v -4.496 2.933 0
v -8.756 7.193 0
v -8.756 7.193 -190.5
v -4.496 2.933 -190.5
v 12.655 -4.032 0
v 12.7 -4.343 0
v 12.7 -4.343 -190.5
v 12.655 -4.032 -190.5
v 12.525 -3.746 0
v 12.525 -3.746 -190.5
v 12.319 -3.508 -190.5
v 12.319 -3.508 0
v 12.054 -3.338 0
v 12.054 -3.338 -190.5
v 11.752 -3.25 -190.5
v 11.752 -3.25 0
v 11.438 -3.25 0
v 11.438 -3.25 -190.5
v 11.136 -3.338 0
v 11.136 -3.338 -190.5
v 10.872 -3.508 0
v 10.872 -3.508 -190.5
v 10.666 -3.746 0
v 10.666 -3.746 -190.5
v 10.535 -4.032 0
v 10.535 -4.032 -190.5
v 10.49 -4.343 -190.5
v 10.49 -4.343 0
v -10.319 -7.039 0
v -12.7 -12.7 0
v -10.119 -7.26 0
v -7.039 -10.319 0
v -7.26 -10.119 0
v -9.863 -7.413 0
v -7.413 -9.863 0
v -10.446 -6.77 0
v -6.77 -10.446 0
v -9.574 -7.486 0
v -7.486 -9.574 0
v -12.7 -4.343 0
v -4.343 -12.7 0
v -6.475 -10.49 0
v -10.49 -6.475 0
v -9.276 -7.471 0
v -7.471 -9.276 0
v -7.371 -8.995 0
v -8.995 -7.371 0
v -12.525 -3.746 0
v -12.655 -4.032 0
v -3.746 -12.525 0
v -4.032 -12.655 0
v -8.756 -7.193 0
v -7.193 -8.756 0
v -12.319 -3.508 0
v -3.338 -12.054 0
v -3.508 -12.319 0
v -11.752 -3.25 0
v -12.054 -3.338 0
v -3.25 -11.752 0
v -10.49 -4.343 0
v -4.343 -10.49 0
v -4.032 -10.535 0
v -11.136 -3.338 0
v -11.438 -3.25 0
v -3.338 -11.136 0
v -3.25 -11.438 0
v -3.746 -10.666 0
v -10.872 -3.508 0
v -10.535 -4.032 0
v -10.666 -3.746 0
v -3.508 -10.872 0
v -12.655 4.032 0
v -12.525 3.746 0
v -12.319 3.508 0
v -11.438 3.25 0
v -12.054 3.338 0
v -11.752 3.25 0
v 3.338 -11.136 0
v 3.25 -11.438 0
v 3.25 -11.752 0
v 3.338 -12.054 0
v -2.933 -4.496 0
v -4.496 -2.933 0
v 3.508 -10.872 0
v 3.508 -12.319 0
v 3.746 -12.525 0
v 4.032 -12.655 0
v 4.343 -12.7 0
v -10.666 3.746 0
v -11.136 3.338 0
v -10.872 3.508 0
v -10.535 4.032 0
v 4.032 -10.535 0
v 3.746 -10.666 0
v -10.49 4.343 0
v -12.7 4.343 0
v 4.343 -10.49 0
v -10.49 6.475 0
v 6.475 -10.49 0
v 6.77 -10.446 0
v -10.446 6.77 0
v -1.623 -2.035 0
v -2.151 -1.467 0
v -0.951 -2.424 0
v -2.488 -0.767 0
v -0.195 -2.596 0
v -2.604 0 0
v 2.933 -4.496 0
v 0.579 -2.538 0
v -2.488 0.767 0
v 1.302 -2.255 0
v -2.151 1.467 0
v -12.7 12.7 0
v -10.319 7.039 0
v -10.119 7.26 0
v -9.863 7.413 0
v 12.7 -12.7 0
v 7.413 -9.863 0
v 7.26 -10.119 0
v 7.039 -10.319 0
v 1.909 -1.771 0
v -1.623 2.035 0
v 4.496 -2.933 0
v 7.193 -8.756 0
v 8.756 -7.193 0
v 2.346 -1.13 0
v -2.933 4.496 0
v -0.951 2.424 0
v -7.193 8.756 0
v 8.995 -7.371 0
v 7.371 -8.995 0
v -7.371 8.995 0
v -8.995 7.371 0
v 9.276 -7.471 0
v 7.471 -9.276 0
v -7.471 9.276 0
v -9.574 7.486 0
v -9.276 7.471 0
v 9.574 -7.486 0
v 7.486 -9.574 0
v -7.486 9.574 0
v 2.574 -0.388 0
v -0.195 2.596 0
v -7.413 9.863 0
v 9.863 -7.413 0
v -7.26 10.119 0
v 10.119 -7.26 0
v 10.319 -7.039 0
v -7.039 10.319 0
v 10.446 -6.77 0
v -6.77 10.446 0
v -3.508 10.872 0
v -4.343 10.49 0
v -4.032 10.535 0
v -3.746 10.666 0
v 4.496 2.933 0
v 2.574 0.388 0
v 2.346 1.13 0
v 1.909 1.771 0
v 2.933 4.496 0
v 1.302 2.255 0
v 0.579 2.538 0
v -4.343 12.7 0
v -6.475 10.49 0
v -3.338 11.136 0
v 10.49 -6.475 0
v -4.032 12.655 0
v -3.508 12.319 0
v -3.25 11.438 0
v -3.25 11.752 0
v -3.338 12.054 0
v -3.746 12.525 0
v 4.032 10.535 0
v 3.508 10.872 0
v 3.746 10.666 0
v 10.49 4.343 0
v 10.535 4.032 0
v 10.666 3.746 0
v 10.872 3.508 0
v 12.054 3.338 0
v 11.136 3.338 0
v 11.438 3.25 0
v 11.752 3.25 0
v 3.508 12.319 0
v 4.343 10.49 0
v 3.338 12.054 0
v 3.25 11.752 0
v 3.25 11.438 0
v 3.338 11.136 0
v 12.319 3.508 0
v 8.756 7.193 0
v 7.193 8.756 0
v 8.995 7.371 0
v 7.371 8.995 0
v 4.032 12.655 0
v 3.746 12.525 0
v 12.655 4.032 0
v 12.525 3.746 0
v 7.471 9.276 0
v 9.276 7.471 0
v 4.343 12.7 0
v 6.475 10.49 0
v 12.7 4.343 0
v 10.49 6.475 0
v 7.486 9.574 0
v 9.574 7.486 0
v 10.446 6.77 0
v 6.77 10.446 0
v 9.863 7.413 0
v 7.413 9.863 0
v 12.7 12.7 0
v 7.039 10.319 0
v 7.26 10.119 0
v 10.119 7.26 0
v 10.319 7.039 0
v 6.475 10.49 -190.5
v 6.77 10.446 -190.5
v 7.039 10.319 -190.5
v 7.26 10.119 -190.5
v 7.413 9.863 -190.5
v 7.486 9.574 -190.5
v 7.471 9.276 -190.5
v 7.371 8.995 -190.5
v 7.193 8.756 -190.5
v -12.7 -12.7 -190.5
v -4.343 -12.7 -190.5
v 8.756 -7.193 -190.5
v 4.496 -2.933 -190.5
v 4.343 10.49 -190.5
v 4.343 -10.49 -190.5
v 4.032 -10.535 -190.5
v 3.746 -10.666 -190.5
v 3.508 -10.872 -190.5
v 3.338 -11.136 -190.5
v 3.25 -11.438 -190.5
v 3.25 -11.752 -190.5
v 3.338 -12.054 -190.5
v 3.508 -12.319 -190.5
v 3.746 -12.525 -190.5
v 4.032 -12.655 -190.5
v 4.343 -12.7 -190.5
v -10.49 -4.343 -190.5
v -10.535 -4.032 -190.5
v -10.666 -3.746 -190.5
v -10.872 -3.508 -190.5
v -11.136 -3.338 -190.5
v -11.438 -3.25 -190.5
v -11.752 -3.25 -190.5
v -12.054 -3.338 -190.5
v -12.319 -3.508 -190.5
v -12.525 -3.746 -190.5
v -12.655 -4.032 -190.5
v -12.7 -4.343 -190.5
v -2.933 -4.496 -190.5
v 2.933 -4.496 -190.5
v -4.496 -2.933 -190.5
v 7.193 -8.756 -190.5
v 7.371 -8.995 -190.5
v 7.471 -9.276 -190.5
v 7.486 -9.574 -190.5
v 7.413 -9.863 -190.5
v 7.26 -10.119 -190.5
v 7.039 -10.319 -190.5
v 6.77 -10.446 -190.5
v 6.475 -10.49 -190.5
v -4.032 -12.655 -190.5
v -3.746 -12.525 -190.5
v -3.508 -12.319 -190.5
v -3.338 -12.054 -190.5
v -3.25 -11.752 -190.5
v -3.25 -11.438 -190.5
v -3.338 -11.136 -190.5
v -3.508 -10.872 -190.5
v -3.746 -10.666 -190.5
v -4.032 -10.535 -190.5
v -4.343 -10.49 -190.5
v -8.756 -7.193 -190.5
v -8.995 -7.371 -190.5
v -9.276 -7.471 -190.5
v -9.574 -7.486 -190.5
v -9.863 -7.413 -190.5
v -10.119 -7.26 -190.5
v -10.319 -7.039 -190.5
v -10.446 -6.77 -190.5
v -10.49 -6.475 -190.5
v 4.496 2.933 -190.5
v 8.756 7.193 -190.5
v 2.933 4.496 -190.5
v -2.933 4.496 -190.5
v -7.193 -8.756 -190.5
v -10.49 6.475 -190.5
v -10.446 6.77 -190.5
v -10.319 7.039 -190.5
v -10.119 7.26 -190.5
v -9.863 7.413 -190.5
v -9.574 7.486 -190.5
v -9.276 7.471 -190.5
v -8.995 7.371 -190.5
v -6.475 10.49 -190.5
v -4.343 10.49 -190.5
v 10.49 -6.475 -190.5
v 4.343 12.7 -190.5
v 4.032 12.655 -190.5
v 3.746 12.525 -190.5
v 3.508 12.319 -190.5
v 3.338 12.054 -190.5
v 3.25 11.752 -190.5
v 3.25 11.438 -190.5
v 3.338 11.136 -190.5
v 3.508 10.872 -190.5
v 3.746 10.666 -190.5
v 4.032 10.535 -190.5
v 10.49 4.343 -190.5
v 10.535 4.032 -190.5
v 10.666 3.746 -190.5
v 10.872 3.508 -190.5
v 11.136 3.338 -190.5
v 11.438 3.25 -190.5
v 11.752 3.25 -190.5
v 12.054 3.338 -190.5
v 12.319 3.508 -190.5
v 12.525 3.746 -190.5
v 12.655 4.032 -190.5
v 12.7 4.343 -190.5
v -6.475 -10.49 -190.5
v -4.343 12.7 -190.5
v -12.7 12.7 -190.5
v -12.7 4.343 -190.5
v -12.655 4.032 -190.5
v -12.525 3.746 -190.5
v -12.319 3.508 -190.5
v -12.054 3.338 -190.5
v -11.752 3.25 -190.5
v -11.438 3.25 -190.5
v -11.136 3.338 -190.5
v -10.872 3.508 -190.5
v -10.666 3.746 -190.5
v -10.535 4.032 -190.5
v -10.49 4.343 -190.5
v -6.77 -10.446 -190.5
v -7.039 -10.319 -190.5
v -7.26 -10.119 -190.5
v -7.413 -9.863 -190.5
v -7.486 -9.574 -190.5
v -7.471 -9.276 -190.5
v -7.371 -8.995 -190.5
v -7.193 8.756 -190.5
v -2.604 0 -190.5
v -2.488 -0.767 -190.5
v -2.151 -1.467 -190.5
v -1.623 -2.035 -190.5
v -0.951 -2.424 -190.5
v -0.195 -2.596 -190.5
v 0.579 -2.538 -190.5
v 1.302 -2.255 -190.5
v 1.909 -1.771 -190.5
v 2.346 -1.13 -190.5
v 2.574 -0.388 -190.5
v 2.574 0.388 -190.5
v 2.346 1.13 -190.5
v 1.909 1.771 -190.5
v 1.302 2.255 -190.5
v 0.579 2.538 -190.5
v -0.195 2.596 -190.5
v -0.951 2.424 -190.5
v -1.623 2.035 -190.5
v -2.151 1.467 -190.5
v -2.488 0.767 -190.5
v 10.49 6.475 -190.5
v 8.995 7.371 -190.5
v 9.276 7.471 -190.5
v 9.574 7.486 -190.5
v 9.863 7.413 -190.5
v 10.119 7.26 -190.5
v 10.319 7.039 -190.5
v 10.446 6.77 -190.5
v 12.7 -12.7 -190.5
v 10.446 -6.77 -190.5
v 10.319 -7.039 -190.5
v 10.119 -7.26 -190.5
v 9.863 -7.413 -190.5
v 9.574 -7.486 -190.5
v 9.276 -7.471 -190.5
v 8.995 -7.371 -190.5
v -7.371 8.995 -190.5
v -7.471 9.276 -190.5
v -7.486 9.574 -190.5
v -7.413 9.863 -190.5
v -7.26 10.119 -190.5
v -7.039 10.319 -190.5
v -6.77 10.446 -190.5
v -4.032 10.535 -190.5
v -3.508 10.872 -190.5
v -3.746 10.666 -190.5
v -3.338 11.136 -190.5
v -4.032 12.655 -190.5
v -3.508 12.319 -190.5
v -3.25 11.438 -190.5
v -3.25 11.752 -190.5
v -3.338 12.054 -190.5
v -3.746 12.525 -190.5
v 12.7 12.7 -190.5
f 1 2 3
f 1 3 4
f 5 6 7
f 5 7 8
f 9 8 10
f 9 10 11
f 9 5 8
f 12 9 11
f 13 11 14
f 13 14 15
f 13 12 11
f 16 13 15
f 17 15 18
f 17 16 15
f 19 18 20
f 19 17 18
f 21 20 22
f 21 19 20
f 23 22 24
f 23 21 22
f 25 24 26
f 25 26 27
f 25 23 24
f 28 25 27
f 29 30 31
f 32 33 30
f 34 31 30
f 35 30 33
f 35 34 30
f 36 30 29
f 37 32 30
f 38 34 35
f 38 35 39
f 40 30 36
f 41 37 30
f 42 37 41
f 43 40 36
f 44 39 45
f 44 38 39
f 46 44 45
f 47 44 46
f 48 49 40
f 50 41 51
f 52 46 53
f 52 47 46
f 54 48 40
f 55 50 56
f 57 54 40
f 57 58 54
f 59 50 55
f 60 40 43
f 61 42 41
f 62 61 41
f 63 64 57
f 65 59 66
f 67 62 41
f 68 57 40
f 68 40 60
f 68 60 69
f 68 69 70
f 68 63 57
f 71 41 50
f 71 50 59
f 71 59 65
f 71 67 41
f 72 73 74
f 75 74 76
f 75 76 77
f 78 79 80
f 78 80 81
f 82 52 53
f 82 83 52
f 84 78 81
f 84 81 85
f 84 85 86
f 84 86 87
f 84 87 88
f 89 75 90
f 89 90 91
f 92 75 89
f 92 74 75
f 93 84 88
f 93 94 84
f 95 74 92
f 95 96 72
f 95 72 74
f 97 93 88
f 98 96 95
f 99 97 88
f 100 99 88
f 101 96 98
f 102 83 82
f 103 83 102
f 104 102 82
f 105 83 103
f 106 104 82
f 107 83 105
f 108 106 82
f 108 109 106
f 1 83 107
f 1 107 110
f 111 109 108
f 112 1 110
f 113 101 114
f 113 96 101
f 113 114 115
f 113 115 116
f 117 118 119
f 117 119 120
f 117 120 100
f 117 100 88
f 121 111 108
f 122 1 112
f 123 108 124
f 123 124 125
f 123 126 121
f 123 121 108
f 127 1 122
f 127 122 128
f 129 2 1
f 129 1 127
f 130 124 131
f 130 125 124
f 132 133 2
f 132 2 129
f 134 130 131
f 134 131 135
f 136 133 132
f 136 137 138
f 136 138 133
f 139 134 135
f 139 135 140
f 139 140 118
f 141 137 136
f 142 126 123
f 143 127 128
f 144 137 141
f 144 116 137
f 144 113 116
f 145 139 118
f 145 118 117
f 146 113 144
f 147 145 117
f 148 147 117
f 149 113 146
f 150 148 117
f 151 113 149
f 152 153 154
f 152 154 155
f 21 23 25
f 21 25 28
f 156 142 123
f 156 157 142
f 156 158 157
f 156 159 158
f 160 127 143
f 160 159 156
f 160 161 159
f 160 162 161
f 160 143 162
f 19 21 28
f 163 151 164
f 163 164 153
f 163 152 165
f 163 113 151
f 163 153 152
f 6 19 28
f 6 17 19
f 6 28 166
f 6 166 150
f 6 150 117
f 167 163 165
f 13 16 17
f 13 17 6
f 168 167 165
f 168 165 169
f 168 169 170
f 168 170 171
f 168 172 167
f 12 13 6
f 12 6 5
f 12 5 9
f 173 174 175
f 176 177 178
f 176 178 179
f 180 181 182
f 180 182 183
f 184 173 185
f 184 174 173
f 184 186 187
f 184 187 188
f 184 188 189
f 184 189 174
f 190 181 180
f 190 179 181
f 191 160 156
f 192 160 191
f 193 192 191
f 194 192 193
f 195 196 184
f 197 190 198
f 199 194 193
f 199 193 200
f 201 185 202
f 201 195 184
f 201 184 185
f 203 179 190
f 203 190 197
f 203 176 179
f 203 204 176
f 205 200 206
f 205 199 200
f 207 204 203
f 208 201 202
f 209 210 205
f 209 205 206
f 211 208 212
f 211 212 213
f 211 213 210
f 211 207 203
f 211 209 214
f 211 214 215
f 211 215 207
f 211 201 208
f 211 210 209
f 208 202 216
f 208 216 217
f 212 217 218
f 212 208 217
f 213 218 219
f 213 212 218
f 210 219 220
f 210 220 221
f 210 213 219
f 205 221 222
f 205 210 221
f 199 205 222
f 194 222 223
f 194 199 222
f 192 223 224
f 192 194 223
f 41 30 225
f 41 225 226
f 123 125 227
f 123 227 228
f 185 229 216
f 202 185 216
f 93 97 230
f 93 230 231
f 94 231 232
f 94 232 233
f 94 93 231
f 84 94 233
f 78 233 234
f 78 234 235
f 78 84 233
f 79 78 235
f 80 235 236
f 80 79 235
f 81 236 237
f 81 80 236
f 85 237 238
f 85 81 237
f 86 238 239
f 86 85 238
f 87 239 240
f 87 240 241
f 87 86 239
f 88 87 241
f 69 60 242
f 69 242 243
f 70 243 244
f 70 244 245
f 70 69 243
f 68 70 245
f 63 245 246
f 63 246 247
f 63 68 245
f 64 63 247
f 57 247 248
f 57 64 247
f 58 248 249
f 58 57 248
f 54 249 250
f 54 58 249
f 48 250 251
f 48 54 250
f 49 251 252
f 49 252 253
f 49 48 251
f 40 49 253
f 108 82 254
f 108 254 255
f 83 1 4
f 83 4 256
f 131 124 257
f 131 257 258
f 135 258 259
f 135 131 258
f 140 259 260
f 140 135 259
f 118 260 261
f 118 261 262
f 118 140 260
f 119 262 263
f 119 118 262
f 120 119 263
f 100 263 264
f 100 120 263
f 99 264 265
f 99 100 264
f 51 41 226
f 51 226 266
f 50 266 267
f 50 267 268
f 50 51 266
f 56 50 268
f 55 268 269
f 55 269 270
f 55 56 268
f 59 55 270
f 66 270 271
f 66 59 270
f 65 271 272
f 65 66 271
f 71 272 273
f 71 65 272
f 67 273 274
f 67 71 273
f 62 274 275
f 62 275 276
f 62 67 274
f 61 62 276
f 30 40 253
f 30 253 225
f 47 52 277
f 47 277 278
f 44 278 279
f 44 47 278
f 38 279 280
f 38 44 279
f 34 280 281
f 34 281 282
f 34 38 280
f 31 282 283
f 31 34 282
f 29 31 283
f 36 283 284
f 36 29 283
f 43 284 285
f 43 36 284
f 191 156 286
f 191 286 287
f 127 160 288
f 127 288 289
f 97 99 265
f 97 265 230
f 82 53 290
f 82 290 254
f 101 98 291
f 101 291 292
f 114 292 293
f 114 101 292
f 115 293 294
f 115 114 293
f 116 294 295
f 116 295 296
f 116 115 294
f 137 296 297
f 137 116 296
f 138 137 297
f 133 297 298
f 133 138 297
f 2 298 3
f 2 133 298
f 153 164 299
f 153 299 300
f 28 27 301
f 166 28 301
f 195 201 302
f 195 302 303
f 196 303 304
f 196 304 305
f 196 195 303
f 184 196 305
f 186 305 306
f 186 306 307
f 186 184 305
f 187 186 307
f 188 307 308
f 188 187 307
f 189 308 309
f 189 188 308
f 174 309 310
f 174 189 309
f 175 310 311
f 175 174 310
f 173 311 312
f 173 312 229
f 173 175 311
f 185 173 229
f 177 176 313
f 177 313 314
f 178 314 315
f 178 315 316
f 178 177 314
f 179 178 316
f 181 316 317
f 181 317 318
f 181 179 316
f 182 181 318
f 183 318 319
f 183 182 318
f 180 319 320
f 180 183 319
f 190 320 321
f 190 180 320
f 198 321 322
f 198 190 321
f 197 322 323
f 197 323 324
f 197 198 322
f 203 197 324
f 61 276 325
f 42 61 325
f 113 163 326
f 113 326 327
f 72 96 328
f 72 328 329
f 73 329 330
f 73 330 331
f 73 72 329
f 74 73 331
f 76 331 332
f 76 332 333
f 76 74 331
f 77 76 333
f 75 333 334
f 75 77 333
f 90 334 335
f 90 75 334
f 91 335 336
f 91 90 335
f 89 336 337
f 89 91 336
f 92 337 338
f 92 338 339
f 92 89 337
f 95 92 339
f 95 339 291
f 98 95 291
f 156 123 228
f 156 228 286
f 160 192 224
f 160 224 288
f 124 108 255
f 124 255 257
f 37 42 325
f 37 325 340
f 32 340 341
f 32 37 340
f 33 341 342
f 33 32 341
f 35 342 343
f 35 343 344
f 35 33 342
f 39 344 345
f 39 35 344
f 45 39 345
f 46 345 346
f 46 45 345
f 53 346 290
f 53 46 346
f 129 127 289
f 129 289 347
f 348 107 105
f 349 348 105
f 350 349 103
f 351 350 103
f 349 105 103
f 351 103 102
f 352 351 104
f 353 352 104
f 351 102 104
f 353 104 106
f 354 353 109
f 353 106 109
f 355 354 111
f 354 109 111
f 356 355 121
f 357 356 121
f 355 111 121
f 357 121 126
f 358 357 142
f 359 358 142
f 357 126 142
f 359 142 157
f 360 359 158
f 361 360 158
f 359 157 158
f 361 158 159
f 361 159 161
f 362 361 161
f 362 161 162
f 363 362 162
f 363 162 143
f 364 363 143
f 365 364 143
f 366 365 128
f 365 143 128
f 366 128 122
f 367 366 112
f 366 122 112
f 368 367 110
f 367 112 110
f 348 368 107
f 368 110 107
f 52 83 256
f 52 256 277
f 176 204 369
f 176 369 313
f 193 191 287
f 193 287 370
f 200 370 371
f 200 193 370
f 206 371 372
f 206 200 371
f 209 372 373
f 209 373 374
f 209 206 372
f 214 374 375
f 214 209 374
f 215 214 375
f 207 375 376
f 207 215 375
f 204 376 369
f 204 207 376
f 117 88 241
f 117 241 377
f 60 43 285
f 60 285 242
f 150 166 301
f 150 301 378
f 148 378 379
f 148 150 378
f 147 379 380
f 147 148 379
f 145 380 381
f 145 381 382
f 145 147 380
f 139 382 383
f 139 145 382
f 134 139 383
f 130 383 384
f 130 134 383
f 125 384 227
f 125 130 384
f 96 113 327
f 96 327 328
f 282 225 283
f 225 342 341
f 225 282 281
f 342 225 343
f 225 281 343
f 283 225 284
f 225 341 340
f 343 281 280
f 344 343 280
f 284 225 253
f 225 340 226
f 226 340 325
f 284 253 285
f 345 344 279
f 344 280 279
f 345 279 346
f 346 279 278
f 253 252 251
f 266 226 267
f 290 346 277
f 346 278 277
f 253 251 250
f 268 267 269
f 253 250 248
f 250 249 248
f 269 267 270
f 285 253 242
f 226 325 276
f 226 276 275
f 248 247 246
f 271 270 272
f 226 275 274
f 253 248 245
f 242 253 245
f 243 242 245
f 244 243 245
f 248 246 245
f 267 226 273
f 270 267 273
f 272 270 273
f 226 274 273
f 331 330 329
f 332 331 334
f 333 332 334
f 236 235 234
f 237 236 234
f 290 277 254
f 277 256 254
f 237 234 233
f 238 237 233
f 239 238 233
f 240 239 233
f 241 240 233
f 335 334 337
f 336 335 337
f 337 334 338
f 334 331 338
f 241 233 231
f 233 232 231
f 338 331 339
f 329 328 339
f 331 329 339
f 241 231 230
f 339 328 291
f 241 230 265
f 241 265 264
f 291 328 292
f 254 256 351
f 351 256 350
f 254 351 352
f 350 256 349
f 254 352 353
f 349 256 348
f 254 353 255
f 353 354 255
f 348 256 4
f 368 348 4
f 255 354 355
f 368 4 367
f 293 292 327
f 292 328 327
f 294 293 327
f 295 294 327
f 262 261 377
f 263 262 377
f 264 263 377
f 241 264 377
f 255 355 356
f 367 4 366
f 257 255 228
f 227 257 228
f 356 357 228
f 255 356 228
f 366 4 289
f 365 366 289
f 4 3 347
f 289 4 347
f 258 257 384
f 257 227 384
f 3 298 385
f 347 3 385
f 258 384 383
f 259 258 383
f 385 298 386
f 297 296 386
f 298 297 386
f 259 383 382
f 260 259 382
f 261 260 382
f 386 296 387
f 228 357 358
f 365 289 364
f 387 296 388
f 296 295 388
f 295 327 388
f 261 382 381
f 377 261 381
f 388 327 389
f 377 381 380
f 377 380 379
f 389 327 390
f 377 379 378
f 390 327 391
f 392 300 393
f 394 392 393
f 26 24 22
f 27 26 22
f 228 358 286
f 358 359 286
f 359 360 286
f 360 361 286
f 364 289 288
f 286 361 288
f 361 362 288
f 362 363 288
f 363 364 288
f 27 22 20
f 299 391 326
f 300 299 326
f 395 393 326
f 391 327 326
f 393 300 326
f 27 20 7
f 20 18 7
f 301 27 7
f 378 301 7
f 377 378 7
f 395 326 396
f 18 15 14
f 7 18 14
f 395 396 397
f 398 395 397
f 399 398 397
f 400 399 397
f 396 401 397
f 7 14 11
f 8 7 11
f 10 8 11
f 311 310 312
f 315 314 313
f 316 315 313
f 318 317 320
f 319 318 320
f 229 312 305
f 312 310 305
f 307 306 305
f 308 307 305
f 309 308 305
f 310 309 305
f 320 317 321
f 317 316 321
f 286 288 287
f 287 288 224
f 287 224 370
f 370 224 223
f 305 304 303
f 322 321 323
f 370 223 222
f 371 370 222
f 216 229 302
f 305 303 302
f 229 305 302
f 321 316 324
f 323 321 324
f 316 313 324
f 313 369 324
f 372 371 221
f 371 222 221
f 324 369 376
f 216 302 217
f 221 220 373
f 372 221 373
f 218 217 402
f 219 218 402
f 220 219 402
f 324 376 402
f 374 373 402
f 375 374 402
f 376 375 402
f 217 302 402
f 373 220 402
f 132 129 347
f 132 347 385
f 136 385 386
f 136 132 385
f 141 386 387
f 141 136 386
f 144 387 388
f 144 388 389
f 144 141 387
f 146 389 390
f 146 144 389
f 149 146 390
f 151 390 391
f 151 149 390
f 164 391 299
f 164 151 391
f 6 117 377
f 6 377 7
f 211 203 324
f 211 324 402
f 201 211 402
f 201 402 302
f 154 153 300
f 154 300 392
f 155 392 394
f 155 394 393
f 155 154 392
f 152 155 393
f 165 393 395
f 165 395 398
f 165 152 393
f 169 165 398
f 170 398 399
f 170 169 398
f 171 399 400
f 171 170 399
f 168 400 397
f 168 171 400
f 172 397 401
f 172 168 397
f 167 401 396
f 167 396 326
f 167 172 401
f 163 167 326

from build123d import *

# Parameters (mm, degrees)
SKETCH1_R           = 2.6035
BOSS_EXTRUDE1_DEPTH = 190.5


with BuildPart() as part:
    # Sketch1 → Boss-Extrude1 (new body)
    with BuildSketch(Plane.XY):
        with BuildLine():
            Line((-12.7, -12.7), (-4.343399971, -12.7))
            ThreePointArc((-4.343399971, -12.7), (-3.238499971, -11.5951), (-4.343399971, -10.4902))
            Line((-4.343399971, -10.4902), (-6.474794456, -10.4902))
            ThreePointArc((-6.474794456, -10.4902), (-7.413456061, -9.863006367), (-7.193214945, -8.75577951))
            Line((-7.193214945, -8.75577951), (-2.933235435, -4.4958))
            Line((-2.933235435, -4.4958), (2.933235435, -4.4958))
            Line((2.933235435, -4.4958), (7.193214945, -8.75577951))
            ThreePointArc((7.193214945, -8.75577951), (7.413456061, -9.863006367), (6.474794456, -10.4902))
            Line((6.474794456, -10.4902), (4.3434, -10.4902))
            ThreePointArc((4.3434, -10.4902), (3.2385, -11.5951), (4.3434, -12.7))
            Line((4.3434, -12.7), (12.7, -12.7))
            Line((12.7, -12.7), (12.7, -4.343399971))
            ThreePointArc((12.7, -4.343399971), (11.5951, -3.238499971), (10.4902, -4.343399971))
            Line((10.4902, -4.343399971), (10.4902, -6.474794456))
            ThreePointArc((10.4902, -6.474794456), (9.863006367, -7.413456061), (8.75577951, -7.193214945))
            Line((8.75577951, -7.193214945), (4.4958, -2.933235435))
            Line((4.4958, -2.933235435), (4.4958, 2.933235435))
            Line((4.4958, 2.933235435), (8.75577951, 7.193214945))
            ThreePointArc((8.75577951, 7.193214945), (9.863006367, 7.413456061), (10.4902, 6.474794456))
            Line((10.4902, 6.474794456), (10.4902, 4.3434))
            ThreePointArc((10.4902, 4.3434), (11.5951, 3.2385), (12.7, 4.3434))
            Line((12.7, 4.3434), (12.7, 12.7))
            Line((12.7, 12.7), (4.343399971, 12.7))
            ThreePointArc((4.343399971, 12.7), (3.238499971, 11.5951), (4.343399971, 10.4902))
            Line((4.343399971, 10.4902), (6.474794456, 10.4902))
            ThreePointArc((6.474794456, 10.4902), (7.413456061, 9.863006367), (7.193214945, 8.75577951))
            Line((7.193214945, 8.75577951), (2.933235435, 4.4958))
            Line((2.933235435, 4.4958), (-2.933235435, 4.4958))
            Line((-2.933235435, 4.4958), (-7.193214945, 8.75577951))
            ThreePointArc((-7.193214945, 8.75577951), (-7.413456061, 9.863006367), (-6.474794456, 10.4902))
            Line((-6.474794456, 10.4902), (-4.3434, 10.4902))
            ThreePointArc((-4.3434, 10.4902), (-3.2385, 11.5951), (-4.3434, 12.7))
            Line((-4.3434, 12.7), (-12.7, 12.7))
            Line((-12.7, 12.7), (-12.7, 4.343399971))
            ThreePointArc((-12.7, 4.343399971), (-11.5951, 3.238499971), (-10.4902, 4.343399971))
            Line((-10.4902, 4.343399971), (-10.4902, 6.474794456))
            ThreePointArc((-10.4902, 6.474794456), (-9.863006367, 7.413456061), (-8.75577951, 7.193214945))
            Line((-8.75577951, 7.193214945), (-4.4958, 2.933235435))
            Line((-4.4958, 2.933235435), (-4.4958, -2.933235435))
            Line((-4.4958, -2.933235435), (-8.75577951, -7.193214945))
            ThreePointArc((-8.75577951, -7.193214945), (-9.863006367, -7.413456061), (-10.4902, -6.474794456))
            Line((-10.4902, -6.474794456), (-10.4902, -4.3434))
            ThreePointArc((-10.4902, -4.3434), (-11.5951, -3.2385), (-12.7, -4.3434))
            Line((-12.7, -4.3434), (-12.7, -12.7))
        make_face()
        with Locations(Location((0, 0, 0), (0, 0, 180))):
            Circle(SKETCH1_R, mode=Mode.SUBTRACT)
    extrude(amount=-BOSS_EXTRUDE1_DEPTH)


solid = part.part
